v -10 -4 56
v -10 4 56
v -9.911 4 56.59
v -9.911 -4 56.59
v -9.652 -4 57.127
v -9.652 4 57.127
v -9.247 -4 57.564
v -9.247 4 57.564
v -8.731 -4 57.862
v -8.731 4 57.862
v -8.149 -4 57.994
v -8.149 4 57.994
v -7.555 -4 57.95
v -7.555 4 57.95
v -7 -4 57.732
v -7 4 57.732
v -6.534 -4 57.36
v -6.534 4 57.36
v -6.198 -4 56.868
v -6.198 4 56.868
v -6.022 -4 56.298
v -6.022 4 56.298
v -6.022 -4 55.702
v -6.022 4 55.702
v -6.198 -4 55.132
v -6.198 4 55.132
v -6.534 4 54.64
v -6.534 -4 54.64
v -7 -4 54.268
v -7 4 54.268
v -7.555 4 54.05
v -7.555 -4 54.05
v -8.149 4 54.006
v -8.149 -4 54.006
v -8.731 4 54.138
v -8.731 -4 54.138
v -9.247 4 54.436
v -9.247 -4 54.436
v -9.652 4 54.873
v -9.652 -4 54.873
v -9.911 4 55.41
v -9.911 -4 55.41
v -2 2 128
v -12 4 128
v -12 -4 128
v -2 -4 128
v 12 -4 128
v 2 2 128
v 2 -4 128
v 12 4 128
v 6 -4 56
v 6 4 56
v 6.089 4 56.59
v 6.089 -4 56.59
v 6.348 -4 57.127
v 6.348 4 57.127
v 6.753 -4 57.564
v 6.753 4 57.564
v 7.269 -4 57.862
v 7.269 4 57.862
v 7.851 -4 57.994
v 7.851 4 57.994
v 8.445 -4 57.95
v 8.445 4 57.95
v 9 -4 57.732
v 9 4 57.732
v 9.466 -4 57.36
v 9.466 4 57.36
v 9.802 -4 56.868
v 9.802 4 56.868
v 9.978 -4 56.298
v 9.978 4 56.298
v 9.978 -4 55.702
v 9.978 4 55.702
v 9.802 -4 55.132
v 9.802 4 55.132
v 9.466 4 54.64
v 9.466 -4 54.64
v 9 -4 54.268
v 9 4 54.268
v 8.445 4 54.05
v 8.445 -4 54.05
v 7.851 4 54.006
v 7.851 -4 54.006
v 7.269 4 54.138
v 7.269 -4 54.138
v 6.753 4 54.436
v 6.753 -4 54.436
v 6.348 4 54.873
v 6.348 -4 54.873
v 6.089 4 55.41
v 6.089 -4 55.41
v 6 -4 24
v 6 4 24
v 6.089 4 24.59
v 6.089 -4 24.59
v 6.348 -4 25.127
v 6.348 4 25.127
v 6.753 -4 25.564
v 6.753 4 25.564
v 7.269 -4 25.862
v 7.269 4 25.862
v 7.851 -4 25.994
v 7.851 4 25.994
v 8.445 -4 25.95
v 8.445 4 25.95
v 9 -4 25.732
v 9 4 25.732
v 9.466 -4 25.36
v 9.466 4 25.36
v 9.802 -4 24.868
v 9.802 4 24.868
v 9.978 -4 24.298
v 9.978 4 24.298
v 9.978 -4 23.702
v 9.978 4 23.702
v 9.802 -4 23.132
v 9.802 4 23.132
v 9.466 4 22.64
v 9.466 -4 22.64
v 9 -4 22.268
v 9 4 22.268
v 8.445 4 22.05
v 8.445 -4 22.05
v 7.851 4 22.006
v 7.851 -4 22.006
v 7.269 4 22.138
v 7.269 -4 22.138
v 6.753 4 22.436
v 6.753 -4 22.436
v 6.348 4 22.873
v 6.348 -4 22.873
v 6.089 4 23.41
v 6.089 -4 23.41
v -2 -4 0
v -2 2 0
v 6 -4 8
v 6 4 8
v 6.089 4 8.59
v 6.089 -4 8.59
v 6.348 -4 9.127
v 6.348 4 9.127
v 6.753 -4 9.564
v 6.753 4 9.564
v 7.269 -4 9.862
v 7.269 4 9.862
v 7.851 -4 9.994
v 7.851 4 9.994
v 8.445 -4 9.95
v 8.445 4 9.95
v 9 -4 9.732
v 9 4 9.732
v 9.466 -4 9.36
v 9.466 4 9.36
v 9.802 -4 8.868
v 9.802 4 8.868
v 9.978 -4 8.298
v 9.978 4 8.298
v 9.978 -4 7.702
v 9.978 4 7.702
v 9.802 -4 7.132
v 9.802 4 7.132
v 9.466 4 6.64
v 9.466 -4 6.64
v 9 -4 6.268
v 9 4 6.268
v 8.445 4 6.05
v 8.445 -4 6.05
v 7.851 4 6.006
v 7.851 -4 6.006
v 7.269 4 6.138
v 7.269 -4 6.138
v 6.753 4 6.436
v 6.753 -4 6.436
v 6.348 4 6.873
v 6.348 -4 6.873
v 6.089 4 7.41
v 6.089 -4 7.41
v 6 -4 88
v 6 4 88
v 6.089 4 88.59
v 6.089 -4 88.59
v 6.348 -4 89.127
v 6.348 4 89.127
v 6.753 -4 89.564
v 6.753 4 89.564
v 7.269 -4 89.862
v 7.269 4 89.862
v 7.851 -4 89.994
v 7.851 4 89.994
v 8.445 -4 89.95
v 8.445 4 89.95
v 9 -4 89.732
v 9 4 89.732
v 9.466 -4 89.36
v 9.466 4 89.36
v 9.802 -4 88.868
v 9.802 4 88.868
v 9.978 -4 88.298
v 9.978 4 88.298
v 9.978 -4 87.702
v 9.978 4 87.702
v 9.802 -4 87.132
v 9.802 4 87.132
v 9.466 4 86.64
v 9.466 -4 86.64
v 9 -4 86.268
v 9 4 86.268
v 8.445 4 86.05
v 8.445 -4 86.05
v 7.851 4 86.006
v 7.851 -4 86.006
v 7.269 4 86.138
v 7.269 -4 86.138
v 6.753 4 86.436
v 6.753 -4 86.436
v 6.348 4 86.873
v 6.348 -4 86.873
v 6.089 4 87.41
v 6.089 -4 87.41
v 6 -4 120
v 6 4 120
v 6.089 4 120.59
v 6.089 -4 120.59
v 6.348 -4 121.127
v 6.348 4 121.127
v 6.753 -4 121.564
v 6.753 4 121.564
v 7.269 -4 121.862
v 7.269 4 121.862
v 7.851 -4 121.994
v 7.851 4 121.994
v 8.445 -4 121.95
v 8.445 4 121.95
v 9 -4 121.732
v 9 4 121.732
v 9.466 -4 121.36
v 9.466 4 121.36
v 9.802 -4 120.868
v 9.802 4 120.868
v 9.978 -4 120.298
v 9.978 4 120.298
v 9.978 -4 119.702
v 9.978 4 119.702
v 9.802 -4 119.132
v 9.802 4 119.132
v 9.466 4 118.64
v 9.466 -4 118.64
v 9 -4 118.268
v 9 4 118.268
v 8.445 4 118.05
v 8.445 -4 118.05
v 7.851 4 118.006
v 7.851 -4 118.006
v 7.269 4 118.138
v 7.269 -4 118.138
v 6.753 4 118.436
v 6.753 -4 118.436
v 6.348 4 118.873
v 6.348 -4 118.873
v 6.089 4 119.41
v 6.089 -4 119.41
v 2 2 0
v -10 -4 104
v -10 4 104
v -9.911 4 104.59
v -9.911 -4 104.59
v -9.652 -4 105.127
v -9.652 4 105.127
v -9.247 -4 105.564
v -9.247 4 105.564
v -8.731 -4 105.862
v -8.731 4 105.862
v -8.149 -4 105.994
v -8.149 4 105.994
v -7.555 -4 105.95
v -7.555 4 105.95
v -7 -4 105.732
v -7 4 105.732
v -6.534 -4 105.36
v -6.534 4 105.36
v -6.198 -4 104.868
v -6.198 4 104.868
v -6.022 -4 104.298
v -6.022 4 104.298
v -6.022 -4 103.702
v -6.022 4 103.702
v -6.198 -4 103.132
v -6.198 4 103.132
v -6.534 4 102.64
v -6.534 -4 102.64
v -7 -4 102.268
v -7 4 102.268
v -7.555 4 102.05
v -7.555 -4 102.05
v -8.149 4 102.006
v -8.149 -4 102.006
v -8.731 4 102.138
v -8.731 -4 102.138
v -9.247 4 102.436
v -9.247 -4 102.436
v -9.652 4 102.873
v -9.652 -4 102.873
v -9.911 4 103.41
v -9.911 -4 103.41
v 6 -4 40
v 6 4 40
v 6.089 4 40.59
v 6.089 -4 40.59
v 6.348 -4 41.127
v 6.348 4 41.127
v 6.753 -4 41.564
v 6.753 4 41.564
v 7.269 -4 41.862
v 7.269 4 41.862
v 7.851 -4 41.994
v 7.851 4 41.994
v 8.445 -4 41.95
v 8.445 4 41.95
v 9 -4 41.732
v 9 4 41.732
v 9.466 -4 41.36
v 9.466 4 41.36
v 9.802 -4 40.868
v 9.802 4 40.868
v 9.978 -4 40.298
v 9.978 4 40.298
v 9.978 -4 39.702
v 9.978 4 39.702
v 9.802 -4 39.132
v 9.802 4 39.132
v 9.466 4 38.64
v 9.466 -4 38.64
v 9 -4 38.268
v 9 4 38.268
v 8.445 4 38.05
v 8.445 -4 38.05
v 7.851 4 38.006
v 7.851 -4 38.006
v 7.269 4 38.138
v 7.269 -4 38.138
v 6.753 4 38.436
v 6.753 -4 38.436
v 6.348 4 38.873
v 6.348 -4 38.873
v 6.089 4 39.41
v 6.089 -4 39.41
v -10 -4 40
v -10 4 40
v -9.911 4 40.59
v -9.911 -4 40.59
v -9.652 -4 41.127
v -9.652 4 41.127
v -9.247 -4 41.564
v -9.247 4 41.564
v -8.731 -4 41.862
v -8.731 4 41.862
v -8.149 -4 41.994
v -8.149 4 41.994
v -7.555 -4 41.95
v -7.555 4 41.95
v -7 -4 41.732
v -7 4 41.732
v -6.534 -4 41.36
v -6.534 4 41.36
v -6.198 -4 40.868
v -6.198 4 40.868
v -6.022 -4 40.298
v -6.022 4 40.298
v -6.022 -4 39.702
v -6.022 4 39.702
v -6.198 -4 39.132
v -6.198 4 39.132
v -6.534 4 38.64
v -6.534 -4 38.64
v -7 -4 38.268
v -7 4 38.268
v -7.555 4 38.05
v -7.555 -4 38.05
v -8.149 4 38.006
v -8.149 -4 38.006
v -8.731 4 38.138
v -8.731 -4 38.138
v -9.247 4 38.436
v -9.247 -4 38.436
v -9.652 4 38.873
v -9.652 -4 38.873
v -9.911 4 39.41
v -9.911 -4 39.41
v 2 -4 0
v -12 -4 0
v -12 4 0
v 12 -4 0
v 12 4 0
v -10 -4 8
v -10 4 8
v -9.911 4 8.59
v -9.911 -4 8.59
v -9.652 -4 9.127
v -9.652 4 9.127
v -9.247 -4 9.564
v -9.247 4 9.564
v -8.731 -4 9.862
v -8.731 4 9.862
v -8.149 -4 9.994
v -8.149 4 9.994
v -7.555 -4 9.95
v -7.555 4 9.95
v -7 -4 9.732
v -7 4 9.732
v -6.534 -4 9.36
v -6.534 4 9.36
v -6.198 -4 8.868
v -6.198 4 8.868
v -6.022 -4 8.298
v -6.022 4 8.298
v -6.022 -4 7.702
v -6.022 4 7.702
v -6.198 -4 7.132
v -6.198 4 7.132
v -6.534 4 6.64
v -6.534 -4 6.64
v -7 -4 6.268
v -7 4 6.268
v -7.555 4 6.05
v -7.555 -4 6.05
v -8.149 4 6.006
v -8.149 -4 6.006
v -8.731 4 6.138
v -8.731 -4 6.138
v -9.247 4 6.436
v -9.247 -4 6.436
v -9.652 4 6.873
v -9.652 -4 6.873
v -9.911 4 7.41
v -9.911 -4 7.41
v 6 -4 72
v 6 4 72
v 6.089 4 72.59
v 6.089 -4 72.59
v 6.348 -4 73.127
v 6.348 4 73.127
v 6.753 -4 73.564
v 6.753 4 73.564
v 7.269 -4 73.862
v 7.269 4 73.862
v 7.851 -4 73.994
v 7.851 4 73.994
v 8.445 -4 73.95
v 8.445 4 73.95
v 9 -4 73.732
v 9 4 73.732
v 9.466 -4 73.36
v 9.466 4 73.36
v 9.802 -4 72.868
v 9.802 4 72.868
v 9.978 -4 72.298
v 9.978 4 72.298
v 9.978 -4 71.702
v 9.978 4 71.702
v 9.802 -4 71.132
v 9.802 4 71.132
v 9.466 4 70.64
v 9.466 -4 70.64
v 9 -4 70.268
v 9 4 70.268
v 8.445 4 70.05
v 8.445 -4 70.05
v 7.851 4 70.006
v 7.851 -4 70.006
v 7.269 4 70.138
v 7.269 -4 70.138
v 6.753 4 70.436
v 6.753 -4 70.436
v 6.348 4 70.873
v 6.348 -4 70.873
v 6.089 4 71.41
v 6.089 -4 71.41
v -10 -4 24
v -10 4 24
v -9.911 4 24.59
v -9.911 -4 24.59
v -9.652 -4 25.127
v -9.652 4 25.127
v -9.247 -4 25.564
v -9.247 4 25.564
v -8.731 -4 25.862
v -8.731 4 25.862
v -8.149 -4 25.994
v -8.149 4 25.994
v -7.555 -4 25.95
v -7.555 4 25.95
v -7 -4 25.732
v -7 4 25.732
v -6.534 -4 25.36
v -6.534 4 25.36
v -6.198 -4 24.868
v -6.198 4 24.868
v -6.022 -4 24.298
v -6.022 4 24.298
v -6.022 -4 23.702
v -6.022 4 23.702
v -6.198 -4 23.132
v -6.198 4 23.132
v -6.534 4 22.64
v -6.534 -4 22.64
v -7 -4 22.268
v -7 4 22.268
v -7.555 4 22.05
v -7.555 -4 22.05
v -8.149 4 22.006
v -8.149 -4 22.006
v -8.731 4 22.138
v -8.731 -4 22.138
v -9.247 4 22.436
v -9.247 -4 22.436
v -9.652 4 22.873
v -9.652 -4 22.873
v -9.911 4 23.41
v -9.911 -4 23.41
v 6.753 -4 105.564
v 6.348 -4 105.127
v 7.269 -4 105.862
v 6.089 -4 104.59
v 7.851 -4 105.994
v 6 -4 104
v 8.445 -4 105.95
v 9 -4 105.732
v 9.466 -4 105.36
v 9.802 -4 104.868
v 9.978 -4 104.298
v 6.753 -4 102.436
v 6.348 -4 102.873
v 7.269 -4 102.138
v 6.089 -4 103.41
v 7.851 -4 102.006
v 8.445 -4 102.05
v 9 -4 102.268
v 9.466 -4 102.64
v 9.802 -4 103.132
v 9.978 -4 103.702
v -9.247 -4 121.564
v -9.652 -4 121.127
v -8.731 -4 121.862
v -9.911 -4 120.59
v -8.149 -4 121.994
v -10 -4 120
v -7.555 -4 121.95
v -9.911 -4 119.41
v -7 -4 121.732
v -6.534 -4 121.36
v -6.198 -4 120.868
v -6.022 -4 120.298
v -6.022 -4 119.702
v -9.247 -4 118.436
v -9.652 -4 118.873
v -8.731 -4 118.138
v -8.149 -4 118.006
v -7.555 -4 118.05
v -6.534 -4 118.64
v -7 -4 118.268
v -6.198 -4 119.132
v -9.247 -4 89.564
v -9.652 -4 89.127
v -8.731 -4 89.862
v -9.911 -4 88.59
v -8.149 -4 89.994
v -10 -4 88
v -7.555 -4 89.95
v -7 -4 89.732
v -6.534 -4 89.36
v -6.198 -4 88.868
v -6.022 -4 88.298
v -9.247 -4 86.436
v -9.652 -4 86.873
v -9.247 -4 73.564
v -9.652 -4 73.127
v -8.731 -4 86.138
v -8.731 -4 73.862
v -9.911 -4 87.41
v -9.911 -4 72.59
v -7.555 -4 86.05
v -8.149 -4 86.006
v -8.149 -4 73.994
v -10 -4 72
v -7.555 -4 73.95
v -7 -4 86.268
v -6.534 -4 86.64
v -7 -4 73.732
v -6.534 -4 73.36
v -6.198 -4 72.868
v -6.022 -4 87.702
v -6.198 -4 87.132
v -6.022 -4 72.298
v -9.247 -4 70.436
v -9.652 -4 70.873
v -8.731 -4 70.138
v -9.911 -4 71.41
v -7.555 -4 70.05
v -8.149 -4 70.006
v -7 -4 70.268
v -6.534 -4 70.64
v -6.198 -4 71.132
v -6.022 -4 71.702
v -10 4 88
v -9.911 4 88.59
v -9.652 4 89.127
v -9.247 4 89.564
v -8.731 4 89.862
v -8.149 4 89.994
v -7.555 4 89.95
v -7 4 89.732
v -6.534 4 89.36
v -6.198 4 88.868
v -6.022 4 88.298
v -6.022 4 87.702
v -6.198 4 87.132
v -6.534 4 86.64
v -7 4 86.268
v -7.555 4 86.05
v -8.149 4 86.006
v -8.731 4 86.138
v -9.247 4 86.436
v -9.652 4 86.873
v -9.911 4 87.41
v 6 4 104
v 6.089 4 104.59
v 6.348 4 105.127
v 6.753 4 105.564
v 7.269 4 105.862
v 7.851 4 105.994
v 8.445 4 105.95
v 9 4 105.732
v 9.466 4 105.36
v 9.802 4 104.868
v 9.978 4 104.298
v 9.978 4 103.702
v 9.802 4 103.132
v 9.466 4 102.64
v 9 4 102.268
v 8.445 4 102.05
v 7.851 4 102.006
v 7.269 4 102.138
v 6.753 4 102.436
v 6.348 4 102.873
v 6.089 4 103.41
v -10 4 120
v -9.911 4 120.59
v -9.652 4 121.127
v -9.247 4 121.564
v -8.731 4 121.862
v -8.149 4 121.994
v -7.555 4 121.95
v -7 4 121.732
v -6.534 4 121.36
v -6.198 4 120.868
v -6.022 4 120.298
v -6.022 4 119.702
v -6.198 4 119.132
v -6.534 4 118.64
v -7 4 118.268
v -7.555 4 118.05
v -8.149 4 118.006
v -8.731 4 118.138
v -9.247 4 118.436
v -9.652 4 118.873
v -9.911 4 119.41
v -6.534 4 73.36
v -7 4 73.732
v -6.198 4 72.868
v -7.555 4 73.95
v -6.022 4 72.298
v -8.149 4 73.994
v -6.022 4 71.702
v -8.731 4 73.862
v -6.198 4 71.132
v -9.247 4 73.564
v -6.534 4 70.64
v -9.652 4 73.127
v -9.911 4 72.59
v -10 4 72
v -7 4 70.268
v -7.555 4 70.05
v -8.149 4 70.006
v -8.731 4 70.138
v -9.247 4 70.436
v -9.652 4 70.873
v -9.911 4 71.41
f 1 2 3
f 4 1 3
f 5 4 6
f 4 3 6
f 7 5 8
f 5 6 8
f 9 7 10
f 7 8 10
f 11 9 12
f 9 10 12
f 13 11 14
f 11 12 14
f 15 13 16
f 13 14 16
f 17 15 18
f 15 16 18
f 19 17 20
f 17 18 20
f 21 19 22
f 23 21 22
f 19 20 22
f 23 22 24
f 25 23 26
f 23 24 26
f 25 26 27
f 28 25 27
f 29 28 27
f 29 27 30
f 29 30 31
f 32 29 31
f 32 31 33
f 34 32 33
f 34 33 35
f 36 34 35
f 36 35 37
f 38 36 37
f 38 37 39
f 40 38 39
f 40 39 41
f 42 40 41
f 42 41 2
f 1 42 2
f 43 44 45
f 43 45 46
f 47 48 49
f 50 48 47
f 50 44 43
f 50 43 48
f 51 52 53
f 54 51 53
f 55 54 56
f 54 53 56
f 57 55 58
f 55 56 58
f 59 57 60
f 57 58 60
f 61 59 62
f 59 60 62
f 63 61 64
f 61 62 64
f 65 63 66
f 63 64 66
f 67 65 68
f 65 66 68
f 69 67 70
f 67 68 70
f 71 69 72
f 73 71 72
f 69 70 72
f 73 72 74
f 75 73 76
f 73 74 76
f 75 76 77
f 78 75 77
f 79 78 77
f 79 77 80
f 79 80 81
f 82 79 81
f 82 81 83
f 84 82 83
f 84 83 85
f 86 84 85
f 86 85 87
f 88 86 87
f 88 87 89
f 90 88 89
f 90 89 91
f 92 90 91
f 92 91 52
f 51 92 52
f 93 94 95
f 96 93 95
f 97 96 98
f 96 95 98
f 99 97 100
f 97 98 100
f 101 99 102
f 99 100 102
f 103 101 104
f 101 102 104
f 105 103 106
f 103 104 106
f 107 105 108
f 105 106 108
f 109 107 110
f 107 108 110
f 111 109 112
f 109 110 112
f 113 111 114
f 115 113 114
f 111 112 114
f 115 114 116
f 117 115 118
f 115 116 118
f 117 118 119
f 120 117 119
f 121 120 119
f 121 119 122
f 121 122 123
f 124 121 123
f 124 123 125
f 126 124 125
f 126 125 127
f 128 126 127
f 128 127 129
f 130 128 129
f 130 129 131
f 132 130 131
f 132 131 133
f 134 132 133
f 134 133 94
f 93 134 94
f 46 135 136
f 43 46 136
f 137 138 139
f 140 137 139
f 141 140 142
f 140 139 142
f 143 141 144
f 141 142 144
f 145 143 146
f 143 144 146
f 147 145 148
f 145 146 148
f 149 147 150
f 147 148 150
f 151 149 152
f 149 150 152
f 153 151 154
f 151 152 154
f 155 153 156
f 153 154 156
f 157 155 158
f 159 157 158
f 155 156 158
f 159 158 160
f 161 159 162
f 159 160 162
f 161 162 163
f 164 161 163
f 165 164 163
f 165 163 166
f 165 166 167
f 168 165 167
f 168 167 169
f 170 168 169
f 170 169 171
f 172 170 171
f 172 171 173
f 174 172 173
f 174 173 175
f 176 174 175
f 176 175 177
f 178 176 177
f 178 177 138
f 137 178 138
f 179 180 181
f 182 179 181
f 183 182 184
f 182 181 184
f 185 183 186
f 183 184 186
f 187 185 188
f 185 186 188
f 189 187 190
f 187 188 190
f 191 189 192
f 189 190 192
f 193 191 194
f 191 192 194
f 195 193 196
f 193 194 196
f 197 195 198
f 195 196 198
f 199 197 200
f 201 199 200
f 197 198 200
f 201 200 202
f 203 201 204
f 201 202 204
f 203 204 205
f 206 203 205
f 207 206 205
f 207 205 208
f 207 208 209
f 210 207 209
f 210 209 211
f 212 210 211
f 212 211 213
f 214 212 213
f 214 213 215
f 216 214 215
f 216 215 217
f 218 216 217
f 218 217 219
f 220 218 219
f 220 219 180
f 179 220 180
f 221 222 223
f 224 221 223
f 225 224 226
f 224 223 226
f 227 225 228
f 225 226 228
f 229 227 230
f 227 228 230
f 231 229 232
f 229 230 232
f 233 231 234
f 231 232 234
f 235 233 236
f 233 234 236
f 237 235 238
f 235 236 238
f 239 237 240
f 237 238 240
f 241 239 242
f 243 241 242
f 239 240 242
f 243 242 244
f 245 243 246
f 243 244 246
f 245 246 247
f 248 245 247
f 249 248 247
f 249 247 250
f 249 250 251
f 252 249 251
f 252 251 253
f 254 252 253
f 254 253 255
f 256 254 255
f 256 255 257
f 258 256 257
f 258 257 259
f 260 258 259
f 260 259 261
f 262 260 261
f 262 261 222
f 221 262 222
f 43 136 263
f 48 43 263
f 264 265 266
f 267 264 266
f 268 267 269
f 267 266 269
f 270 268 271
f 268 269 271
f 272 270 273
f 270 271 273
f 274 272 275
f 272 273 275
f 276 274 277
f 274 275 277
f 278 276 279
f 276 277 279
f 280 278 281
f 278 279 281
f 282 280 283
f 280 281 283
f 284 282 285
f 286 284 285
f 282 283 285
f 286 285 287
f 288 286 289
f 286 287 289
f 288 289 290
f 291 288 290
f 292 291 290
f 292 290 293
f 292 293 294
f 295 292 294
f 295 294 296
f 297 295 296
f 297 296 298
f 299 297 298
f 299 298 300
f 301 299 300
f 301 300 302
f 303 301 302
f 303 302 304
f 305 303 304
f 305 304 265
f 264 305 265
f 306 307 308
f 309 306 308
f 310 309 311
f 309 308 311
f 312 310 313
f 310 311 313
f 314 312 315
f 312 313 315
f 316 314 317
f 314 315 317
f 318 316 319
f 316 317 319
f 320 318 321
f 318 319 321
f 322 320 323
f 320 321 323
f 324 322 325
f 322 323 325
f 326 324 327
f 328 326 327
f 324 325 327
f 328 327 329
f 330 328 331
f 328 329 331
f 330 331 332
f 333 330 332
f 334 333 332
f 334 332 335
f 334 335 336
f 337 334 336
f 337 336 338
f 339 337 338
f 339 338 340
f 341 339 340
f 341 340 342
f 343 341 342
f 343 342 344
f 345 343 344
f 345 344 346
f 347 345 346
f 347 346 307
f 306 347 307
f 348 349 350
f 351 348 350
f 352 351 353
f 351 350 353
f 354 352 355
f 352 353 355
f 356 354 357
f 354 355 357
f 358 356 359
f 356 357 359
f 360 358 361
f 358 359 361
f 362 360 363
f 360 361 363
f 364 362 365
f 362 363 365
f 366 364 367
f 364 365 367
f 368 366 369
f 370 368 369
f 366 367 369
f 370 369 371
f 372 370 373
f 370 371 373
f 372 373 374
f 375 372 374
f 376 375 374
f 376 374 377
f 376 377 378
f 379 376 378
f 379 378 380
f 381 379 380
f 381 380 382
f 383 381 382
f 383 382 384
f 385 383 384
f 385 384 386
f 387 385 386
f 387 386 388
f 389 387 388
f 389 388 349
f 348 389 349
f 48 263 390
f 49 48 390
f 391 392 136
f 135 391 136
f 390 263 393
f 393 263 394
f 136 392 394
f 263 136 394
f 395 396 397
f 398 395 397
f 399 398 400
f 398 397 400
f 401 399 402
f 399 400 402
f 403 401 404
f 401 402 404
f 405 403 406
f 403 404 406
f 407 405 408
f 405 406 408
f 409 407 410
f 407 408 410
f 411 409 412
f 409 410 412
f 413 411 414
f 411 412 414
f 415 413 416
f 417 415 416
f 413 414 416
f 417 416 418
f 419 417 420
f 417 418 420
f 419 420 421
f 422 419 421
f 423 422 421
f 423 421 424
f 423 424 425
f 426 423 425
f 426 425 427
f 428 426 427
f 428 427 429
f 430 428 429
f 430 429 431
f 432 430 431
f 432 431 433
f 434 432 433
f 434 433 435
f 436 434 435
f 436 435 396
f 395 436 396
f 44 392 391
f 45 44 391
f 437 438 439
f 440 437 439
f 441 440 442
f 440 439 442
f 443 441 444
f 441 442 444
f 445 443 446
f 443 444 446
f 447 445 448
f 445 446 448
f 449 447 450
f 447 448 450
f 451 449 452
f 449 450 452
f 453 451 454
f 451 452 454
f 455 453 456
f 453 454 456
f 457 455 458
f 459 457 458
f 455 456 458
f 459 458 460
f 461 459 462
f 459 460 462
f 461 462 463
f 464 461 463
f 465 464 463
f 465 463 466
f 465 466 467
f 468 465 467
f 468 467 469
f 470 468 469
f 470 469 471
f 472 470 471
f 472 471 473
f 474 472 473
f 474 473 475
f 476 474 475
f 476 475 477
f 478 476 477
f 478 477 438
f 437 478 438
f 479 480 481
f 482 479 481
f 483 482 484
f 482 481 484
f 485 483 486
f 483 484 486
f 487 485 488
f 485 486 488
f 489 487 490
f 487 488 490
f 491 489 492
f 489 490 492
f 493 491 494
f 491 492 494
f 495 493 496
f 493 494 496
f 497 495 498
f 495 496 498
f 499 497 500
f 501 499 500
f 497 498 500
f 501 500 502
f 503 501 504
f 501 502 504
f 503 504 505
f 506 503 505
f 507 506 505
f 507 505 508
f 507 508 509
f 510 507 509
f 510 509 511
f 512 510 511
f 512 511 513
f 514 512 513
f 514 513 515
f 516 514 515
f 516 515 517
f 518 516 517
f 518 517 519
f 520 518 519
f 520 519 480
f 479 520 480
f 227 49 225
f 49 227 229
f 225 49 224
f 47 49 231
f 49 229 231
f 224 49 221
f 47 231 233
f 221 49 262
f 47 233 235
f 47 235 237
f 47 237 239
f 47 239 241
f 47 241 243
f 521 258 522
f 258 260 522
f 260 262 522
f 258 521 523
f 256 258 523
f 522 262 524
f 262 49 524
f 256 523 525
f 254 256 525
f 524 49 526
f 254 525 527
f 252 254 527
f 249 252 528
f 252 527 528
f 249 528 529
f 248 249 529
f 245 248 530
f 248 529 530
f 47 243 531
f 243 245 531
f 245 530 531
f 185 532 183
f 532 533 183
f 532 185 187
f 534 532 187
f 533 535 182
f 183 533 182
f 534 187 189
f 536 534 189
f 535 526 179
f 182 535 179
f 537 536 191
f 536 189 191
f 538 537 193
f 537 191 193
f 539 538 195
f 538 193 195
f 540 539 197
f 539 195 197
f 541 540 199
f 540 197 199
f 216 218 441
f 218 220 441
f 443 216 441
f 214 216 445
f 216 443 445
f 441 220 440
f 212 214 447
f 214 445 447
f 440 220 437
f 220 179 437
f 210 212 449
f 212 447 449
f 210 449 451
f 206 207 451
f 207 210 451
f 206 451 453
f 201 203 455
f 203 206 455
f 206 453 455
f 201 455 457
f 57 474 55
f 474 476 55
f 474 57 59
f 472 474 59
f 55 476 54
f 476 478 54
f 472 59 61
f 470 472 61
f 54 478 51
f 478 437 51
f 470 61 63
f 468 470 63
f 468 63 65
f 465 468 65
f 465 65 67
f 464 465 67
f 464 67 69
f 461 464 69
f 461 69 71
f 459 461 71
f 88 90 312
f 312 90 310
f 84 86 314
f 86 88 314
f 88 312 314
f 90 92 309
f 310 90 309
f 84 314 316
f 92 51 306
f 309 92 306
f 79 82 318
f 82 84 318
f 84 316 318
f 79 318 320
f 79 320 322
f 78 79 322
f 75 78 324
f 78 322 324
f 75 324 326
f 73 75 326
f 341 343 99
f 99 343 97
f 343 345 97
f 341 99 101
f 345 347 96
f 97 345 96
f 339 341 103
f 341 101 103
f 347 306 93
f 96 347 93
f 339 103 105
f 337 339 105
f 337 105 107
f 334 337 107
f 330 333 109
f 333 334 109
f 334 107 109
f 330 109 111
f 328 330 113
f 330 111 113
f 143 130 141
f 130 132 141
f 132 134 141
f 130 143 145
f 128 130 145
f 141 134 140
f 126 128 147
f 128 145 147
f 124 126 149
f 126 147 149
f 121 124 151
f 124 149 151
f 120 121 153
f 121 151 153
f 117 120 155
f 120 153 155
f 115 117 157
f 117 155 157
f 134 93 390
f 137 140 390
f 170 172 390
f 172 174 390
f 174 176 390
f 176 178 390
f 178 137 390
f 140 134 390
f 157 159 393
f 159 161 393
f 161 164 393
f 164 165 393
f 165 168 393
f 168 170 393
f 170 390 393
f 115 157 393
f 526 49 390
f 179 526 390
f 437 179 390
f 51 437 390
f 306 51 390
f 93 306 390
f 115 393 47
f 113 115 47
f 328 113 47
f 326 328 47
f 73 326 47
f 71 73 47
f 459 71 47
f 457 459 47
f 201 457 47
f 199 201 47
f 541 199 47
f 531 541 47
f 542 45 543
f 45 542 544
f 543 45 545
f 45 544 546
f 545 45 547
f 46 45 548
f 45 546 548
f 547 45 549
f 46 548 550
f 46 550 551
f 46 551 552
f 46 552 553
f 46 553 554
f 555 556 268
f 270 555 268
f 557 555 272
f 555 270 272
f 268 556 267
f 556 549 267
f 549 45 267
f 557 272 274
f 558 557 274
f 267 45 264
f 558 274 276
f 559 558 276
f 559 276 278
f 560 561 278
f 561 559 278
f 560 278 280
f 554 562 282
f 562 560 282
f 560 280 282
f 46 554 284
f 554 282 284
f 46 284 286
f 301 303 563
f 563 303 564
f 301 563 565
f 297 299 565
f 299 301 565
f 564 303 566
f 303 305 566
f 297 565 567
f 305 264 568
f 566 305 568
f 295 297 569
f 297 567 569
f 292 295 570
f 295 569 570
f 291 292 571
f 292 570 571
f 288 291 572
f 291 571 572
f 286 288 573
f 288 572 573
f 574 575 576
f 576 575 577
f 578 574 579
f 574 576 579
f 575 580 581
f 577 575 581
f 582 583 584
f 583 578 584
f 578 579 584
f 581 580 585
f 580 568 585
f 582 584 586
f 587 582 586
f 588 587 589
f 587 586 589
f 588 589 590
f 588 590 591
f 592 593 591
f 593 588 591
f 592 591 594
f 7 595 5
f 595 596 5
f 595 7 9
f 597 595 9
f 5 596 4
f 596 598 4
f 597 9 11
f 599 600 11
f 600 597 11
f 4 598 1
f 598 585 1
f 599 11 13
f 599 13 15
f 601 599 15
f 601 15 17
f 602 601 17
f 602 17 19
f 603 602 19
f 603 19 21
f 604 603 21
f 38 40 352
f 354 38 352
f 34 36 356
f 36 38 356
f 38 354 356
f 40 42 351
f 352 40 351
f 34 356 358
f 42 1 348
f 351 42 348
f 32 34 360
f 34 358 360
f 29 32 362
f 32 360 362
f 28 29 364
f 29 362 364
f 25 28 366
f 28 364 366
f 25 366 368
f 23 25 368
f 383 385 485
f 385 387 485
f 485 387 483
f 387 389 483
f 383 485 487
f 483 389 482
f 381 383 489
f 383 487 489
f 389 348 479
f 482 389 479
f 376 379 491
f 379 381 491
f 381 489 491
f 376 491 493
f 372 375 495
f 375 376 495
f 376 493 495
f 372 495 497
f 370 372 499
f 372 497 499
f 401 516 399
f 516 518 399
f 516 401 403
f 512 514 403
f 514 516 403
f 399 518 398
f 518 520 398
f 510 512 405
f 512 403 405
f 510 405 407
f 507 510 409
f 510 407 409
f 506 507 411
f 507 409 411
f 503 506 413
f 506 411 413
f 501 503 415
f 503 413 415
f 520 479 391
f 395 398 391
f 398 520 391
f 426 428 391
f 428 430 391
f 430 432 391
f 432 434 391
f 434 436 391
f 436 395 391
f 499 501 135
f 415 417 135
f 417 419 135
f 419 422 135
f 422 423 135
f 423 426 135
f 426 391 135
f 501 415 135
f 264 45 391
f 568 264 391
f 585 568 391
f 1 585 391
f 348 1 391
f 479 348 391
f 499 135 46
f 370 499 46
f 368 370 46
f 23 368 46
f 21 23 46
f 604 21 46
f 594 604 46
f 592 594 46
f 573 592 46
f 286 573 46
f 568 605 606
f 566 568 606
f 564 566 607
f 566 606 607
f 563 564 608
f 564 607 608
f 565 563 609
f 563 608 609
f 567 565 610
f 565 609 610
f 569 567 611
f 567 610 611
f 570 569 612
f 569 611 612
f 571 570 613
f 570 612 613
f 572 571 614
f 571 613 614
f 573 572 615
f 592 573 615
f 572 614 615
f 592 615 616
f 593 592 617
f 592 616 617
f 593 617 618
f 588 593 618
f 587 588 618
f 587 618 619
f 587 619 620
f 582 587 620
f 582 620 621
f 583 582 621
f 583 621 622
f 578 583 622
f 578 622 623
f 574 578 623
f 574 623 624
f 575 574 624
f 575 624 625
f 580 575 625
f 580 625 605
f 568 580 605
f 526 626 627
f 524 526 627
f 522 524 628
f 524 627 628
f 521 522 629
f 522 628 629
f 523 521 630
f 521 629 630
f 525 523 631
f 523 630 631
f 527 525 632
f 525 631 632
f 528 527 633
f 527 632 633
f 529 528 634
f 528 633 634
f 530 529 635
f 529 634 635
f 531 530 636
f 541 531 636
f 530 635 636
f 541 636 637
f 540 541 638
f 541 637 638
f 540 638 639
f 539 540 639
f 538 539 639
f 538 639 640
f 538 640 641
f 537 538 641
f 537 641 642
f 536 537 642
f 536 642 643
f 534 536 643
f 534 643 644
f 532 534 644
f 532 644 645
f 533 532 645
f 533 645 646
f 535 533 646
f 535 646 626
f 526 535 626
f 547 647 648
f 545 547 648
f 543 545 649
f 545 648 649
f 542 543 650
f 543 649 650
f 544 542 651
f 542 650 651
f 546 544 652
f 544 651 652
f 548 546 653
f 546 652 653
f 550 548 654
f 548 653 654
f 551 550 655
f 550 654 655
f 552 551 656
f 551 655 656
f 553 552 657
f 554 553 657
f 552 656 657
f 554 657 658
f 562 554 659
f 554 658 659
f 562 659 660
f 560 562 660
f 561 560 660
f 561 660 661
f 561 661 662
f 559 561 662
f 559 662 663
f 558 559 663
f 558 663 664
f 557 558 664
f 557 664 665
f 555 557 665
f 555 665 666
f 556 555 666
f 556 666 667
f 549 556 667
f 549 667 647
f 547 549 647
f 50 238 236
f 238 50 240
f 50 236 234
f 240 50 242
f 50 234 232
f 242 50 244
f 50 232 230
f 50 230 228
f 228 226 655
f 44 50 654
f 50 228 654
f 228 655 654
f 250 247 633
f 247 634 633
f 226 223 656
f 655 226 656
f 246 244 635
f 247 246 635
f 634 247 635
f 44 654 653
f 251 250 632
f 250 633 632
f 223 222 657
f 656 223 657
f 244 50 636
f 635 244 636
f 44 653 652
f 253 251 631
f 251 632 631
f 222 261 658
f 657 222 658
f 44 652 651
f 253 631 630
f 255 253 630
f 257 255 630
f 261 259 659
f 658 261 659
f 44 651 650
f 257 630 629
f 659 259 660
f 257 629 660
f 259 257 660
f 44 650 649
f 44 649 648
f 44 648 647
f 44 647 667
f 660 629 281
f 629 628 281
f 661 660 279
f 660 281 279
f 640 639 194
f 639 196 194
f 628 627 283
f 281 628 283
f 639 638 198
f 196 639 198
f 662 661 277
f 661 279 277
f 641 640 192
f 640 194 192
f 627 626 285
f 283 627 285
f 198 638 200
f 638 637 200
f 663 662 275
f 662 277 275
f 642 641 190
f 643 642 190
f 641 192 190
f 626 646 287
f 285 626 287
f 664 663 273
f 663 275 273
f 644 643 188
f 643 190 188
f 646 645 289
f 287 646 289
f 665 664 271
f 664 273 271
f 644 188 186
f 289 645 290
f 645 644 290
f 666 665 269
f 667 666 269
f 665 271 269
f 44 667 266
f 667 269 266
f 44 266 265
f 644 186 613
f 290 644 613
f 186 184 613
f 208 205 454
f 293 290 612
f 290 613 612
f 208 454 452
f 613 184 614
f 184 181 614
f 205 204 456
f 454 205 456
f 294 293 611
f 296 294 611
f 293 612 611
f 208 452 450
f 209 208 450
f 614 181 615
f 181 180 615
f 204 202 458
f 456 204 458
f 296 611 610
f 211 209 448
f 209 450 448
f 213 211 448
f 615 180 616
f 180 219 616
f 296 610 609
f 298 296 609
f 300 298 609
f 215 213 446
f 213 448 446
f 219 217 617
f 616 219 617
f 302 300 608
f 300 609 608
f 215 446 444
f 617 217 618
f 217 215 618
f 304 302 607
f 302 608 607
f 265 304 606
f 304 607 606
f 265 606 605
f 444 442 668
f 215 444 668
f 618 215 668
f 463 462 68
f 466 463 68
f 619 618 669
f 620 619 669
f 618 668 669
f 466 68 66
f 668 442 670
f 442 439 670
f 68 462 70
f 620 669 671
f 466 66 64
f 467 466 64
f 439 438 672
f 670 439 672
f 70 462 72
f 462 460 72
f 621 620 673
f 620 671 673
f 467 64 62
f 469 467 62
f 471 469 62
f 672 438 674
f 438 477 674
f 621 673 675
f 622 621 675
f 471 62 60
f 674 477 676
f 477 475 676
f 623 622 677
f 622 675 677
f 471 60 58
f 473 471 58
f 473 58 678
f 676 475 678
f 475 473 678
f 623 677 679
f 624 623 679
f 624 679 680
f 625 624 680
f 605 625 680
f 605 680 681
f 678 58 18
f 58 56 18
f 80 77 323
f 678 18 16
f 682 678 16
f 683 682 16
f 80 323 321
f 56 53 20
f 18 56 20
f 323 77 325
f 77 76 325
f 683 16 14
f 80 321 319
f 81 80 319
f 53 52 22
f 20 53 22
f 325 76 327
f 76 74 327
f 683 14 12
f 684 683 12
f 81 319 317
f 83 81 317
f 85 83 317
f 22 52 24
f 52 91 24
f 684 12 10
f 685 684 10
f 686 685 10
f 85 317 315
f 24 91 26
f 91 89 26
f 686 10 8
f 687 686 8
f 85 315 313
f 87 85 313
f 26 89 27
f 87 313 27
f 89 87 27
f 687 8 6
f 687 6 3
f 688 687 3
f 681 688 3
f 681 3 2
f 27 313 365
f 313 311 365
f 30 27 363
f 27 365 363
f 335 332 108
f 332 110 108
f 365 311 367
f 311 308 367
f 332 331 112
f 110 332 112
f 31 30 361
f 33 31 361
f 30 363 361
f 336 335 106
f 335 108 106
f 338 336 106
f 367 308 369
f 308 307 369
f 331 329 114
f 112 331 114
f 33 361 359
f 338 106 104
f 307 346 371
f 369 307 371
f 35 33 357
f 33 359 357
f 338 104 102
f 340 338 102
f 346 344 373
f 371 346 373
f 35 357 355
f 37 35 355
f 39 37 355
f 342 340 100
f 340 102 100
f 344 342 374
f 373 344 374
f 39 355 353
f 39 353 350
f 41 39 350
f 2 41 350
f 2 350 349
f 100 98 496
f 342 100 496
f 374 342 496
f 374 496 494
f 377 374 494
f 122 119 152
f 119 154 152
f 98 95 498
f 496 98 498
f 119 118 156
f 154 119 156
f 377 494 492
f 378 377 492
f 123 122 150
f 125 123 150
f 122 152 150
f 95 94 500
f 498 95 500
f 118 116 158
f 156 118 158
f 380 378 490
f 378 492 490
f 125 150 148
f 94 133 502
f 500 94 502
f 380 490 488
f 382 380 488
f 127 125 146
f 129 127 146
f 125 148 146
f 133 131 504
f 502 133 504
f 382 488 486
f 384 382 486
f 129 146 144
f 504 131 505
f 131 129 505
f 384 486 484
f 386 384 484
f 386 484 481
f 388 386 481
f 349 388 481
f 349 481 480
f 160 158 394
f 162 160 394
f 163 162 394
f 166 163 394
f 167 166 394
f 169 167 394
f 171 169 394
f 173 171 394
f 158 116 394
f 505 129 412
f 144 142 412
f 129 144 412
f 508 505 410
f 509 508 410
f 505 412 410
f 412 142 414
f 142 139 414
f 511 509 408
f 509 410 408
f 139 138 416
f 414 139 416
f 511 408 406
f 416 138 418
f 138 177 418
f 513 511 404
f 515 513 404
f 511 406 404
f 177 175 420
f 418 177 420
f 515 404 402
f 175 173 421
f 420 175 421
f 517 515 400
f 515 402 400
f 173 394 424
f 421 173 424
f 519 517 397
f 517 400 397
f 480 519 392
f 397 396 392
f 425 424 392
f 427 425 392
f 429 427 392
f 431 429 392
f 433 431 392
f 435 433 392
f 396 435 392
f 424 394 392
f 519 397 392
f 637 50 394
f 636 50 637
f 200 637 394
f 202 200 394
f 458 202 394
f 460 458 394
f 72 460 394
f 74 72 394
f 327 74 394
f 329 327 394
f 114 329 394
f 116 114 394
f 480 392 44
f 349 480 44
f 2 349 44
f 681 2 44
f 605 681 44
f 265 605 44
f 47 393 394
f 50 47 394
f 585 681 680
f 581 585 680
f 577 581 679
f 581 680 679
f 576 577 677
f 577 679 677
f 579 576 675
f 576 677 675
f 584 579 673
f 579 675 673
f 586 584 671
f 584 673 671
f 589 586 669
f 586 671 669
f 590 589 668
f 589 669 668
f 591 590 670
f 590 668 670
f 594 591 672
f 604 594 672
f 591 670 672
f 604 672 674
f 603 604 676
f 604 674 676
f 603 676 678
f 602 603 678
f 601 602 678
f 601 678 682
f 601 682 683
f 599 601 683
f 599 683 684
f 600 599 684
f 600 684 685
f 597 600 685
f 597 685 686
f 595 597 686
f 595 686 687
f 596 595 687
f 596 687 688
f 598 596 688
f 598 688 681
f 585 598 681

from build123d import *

# Parameters (mm, degrees)
F1_DEPTH = 128
F2_R     = 2
F3_DEPTH = 25


with BuildPart() as f1:
    # F0 (on Top) → F1 (new body)
    with BuildSketch(Plane.XY):
        Polygon((12, -4), (12, 4), (-12, 4), (-12, -4), (-2, -4), (-2, 2), (2, 2), (2, -4), align=None)
    extrude(amount=F1_DEPTH)

    # F2 (on face) → F3 (cut)
    with BuildSketch(Plane(origin=(0, 4, 0), x_dir=(-1, 0, 0), z_dir=(0, 1, 0))):
        with Locations((-8, 8)):
            Circle(F2_R)
        with Locations((-8, 24)):
            Circle(F2_R)
        with Locations((-8, 40)):
            Circle(F2_R)
        with Locations((-8, 56)):
            Circle(F2_R)
        with Locations((-8, 72)):
            Circle(F2_R)
        with Locations((8, 8)):
            Circle(F2_R)
        with Locations((8, 24)):
            Circle(F2_R)
        with Locations((8, 40)):
            Circle(F2_R)
        with Locations((8, 56)):
            Circle(F2_R)
        with Locations((8, 72)):
            Circle(F2_R)
        with Locations((-8, 88)):
            Circle(F2_R)
        with Locations((-8, 104)):
            Circle(F2_R)
        with Locations((-8, 120)):
            Circle(F2_R)
        with Locations((8, 88)):
            Circle(F2_R)
        with Locations((8, 104)):
            Circle(F2_R)
        with Locations((8, 120)):
            Circle(F2_R)
    extrude(amount=-F3_DEPTH, mode=Mode.SUBTRACT)


solid = f1.part
